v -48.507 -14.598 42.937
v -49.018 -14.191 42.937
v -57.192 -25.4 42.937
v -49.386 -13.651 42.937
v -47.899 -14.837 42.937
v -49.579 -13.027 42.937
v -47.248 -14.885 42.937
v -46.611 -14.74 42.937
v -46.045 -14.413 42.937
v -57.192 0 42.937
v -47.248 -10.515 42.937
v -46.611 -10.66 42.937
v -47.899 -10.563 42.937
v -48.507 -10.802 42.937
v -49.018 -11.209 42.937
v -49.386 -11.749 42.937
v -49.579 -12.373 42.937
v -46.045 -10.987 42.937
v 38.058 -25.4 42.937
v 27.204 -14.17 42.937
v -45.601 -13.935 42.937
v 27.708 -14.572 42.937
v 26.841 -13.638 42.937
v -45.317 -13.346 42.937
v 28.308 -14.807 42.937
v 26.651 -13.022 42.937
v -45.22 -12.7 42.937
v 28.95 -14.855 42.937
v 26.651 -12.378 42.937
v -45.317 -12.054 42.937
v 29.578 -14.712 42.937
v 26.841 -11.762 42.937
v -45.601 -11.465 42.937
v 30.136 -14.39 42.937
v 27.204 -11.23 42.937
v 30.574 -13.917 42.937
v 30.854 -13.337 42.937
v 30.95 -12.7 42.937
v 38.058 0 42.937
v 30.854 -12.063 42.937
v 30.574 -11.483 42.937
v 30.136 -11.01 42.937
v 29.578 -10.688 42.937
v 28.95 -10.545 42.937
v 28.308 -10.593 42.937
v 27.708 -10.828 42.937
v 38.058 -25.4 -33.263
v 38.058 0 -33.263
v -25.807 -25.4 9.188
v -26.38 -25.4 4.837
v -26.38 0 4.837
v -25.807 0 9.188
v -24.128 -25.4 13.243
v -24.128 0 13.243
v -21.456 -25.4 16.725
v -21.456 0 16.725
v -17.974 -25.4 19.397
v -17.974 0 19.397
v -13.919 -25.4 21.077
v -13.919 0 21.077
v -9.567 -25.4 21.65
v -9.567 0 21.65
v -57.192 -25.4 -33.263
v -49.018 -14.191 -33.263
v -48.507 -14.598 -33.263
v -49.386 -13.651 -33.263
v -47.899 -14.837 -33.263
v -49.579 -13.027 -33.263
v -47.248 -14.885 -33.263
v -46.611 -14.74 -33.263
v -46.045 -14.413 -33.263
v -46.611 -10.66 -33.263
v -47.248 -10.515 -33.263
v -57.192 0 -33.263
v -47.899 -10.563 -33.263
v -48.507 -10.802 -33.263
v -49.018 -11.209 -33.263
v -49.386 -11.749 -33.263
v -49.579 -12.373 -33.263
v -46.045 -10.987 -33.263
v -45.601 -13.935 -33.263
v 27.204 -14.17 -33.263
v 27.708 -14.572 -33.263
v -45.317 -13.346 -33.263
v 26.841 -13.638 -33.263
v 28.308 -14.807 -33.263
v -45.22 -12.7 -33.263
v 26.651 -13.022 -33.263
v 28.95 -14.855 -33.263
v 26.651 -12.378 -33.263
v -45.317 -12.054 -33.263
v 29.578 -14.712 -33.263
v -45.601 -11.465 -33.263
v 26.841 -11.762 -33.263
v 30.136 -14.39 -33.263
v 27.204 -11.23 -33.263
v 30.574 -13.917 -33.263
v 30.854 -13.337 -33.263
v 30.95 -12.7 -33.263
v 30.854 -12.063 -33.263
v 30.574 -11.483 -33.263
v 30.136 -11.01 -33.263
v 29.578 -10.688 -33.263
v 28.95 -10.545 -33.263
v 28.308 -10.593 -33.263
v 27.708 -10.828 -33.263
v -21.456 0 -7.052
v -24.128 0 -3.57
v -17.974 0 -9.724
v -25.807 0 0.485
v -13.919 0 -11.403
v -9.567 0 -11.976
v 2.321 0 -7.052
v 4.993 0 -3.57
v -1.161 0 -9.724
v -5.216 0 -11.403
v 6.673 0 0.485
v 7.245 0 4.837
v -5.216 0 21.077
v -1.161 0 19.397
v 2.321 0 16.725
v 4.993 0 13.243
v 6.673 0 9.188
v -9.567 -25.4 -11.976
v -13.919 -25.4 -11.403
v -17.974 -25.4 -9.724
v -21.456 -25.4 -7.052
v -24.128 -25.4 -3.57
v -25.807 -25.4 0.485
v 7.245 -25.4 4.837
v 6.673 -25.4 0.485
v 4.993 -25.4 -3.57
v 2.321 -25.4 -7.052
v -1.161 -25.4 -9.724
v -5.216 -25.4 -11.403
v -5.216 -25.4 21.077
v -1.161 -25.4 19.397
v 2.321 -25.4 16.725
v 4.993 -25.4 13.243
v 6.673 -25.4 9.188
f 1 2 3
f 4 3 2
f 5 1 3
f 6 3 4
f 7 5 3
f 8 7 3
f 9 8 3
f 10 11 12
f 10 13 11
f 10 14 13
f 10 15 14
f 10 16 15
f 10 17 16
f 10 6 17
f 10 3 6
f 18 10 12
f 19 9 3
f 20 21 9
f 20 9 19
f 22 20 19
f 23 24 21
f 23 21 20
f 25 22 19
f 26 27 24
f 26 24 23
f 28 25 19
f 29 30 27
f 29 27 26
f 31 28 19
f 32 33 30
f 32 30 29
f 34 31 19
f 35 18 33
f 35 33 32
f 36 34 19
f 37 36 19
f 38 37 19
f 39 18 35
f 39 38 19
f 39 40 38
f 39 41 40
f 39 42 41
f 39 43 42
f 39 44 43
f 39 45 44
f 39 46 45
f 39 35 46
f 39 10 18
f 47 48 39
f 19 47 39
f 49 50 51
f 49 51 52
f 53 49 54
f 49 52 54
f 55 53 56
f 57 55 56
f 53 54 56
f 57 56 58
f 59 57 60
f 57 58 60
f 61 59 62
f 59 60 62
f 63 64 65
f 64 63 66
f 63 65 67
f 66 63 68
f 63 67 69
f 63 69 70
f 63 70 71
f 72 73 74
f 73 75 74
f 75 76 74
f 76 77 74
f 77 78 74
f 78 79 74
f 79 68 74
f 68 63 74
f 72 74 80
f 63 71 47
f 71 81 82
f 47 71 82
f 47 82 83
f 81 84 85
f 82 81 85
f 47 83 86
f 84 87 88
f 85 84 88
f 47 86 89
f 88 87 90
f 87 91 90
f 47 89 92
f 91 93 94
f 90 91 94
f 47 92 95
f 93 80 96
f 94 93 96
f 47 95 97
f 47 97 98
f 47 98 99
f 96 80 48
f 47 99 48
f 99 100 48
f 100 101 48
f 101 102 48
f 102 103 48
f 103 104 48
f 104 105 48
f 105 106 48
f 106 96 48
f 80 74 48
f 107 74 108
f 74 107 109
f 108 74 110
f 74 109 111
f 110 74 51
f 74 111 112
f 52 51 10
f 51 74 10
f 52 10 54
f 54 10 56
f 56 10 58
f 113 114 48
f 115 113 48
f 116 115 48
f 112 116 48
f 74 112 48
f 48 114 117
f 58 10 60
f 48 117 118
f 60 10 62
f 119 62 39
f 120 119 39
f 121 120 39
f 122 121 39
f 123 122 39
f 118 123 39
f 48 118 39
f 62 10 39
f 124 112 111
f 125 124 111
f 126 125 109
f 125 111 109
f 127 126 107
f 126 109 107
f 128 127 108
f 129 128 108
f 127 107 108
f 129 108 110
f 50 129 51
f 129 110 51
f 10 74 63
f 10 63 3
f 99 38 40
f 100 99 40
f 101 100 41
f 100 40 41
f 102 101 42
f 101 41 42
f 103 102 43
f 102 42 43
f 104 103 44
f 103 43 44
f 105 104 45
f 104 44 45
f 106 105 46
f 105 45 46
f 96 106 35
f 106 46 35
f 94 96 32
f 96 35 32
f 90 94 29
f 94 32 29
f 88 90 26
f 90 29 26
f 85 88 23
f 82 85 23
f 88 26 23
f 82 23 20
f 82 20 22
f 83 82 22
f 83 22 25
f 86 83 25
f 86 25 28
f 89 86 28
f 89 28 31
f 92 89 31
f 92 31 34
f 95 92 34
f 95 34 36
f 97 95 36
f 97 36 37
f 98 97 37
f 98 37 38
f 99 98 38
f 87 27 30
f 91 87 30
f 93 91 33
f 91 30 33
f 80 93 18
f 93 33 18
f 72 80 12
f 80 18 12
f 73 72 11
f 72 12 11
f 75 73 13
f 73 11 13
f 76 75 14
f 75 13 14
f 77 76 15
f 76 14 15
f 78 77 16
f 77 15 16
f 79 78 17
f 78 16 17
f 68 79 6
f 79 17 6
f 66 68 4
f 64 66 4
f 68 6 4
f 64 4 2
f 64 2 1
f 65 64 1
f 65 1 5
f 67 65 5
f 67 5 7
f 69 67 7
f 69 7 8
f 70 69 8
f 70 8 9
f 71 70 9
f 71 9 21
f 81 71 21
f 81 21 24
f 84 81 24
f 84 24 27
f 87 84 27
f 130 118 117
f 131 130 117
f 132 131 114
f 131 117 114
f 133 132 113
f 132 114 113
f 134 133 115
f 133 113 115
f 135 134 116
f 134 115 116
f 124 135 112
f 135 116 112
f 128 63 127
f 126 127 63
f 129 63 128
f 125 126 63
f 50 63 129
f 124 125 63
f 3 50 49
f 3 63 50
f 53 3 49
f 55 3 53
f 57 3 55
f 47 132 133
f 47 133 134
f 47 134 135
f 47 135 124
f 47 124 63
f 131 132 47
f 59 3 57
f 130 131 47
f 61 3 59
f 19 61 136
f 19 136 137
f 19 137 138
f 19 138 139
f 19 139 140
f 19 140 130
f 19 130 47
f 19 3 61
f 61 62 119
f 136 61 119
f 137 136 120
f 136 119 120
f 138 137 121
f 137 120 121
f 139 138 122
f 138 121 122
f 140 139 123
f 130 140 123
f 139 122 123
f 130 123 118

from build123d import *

# Parameters (mm, degrees)
F0_W     = 95.25
F0_H     = 76.2
F1_DEPTH = 25.4
F4_DEPTH = 25.401
F2_R     = 2.161228
F2_R_2   = 2.1916
F5_DEPTH = 76.201


with BuildPart() as f1:
    # F0 (on Front) → F1 (new body)
    with BuildSketch(Plane.XZ):
        with Locations((-9.567424, 4.836748)):
            Rectangle(F0_W, F0_H)
    extrude(amount=F1_DEPTH)

    # F3 (on face) → F4 (cut, through all)
    with BuildSketch(Plane(origin=(0, 0, 0), x_dir=(-1, 0, 0), z_dir=(0, 1, 0))):
        with BuildLine():
            ThreePointArc((26.380295, 4.836748), (21.455919, 16.725243), (9.567424, 21.649619))
            Line((9.567424, 21.649619), (9.567424, 4.836748))
            Line((9.567424, 4.836748), (26.380295, 4.836748))
        make_face()
        with BuildLine():
            Line((9.567424, 4.836748), (9.567424, 21.649619))
            ThreePointArc((9.567424, 21.649619), (-2.321071, 16.725243), (-7.245446, 4.836748))
            Line((-7.245446, 4.836748), (9.567424, 4.836748))
        make_face()
        with BuildLine():
            Line((26.380295, 4.836748), (9.567424, 4.836748))
            Line((9.567424, 4.836748), (9.567424, -11.976122))
            ThreePointArc((9.567424, -11.976122), (21.455919, -7.051746), (26.380295, 4.836748))
        make_face()
        with BuildLine():
            Line((9.567424, -11.976122), (9.567424, 4.836748))
            Line((9.567424, 4.836748), (-7.245446, 4.836748))
            ThreePointArc((-7.245446, 4.836748), (-2.321071, -7.051746), (9.567424, -11.976122))
        make_face()
    extrude(amount=-F4_DEPTH, mode=Mode.SUBTRACT)

    # F2 (on face) → F5 (cut, through all)
    with BuildSketch(Plane.XY.offset(42.936748)):
        with Locations((28.788551, -12.7)):
            Circle(F2_R)
        with Locations((-47.411449, -12.7)):
            Circle(F2_R_2)
    extrude(amount=-F5_DEPTH, mode=Mode.SUBTRACT)


solid = f1.part
